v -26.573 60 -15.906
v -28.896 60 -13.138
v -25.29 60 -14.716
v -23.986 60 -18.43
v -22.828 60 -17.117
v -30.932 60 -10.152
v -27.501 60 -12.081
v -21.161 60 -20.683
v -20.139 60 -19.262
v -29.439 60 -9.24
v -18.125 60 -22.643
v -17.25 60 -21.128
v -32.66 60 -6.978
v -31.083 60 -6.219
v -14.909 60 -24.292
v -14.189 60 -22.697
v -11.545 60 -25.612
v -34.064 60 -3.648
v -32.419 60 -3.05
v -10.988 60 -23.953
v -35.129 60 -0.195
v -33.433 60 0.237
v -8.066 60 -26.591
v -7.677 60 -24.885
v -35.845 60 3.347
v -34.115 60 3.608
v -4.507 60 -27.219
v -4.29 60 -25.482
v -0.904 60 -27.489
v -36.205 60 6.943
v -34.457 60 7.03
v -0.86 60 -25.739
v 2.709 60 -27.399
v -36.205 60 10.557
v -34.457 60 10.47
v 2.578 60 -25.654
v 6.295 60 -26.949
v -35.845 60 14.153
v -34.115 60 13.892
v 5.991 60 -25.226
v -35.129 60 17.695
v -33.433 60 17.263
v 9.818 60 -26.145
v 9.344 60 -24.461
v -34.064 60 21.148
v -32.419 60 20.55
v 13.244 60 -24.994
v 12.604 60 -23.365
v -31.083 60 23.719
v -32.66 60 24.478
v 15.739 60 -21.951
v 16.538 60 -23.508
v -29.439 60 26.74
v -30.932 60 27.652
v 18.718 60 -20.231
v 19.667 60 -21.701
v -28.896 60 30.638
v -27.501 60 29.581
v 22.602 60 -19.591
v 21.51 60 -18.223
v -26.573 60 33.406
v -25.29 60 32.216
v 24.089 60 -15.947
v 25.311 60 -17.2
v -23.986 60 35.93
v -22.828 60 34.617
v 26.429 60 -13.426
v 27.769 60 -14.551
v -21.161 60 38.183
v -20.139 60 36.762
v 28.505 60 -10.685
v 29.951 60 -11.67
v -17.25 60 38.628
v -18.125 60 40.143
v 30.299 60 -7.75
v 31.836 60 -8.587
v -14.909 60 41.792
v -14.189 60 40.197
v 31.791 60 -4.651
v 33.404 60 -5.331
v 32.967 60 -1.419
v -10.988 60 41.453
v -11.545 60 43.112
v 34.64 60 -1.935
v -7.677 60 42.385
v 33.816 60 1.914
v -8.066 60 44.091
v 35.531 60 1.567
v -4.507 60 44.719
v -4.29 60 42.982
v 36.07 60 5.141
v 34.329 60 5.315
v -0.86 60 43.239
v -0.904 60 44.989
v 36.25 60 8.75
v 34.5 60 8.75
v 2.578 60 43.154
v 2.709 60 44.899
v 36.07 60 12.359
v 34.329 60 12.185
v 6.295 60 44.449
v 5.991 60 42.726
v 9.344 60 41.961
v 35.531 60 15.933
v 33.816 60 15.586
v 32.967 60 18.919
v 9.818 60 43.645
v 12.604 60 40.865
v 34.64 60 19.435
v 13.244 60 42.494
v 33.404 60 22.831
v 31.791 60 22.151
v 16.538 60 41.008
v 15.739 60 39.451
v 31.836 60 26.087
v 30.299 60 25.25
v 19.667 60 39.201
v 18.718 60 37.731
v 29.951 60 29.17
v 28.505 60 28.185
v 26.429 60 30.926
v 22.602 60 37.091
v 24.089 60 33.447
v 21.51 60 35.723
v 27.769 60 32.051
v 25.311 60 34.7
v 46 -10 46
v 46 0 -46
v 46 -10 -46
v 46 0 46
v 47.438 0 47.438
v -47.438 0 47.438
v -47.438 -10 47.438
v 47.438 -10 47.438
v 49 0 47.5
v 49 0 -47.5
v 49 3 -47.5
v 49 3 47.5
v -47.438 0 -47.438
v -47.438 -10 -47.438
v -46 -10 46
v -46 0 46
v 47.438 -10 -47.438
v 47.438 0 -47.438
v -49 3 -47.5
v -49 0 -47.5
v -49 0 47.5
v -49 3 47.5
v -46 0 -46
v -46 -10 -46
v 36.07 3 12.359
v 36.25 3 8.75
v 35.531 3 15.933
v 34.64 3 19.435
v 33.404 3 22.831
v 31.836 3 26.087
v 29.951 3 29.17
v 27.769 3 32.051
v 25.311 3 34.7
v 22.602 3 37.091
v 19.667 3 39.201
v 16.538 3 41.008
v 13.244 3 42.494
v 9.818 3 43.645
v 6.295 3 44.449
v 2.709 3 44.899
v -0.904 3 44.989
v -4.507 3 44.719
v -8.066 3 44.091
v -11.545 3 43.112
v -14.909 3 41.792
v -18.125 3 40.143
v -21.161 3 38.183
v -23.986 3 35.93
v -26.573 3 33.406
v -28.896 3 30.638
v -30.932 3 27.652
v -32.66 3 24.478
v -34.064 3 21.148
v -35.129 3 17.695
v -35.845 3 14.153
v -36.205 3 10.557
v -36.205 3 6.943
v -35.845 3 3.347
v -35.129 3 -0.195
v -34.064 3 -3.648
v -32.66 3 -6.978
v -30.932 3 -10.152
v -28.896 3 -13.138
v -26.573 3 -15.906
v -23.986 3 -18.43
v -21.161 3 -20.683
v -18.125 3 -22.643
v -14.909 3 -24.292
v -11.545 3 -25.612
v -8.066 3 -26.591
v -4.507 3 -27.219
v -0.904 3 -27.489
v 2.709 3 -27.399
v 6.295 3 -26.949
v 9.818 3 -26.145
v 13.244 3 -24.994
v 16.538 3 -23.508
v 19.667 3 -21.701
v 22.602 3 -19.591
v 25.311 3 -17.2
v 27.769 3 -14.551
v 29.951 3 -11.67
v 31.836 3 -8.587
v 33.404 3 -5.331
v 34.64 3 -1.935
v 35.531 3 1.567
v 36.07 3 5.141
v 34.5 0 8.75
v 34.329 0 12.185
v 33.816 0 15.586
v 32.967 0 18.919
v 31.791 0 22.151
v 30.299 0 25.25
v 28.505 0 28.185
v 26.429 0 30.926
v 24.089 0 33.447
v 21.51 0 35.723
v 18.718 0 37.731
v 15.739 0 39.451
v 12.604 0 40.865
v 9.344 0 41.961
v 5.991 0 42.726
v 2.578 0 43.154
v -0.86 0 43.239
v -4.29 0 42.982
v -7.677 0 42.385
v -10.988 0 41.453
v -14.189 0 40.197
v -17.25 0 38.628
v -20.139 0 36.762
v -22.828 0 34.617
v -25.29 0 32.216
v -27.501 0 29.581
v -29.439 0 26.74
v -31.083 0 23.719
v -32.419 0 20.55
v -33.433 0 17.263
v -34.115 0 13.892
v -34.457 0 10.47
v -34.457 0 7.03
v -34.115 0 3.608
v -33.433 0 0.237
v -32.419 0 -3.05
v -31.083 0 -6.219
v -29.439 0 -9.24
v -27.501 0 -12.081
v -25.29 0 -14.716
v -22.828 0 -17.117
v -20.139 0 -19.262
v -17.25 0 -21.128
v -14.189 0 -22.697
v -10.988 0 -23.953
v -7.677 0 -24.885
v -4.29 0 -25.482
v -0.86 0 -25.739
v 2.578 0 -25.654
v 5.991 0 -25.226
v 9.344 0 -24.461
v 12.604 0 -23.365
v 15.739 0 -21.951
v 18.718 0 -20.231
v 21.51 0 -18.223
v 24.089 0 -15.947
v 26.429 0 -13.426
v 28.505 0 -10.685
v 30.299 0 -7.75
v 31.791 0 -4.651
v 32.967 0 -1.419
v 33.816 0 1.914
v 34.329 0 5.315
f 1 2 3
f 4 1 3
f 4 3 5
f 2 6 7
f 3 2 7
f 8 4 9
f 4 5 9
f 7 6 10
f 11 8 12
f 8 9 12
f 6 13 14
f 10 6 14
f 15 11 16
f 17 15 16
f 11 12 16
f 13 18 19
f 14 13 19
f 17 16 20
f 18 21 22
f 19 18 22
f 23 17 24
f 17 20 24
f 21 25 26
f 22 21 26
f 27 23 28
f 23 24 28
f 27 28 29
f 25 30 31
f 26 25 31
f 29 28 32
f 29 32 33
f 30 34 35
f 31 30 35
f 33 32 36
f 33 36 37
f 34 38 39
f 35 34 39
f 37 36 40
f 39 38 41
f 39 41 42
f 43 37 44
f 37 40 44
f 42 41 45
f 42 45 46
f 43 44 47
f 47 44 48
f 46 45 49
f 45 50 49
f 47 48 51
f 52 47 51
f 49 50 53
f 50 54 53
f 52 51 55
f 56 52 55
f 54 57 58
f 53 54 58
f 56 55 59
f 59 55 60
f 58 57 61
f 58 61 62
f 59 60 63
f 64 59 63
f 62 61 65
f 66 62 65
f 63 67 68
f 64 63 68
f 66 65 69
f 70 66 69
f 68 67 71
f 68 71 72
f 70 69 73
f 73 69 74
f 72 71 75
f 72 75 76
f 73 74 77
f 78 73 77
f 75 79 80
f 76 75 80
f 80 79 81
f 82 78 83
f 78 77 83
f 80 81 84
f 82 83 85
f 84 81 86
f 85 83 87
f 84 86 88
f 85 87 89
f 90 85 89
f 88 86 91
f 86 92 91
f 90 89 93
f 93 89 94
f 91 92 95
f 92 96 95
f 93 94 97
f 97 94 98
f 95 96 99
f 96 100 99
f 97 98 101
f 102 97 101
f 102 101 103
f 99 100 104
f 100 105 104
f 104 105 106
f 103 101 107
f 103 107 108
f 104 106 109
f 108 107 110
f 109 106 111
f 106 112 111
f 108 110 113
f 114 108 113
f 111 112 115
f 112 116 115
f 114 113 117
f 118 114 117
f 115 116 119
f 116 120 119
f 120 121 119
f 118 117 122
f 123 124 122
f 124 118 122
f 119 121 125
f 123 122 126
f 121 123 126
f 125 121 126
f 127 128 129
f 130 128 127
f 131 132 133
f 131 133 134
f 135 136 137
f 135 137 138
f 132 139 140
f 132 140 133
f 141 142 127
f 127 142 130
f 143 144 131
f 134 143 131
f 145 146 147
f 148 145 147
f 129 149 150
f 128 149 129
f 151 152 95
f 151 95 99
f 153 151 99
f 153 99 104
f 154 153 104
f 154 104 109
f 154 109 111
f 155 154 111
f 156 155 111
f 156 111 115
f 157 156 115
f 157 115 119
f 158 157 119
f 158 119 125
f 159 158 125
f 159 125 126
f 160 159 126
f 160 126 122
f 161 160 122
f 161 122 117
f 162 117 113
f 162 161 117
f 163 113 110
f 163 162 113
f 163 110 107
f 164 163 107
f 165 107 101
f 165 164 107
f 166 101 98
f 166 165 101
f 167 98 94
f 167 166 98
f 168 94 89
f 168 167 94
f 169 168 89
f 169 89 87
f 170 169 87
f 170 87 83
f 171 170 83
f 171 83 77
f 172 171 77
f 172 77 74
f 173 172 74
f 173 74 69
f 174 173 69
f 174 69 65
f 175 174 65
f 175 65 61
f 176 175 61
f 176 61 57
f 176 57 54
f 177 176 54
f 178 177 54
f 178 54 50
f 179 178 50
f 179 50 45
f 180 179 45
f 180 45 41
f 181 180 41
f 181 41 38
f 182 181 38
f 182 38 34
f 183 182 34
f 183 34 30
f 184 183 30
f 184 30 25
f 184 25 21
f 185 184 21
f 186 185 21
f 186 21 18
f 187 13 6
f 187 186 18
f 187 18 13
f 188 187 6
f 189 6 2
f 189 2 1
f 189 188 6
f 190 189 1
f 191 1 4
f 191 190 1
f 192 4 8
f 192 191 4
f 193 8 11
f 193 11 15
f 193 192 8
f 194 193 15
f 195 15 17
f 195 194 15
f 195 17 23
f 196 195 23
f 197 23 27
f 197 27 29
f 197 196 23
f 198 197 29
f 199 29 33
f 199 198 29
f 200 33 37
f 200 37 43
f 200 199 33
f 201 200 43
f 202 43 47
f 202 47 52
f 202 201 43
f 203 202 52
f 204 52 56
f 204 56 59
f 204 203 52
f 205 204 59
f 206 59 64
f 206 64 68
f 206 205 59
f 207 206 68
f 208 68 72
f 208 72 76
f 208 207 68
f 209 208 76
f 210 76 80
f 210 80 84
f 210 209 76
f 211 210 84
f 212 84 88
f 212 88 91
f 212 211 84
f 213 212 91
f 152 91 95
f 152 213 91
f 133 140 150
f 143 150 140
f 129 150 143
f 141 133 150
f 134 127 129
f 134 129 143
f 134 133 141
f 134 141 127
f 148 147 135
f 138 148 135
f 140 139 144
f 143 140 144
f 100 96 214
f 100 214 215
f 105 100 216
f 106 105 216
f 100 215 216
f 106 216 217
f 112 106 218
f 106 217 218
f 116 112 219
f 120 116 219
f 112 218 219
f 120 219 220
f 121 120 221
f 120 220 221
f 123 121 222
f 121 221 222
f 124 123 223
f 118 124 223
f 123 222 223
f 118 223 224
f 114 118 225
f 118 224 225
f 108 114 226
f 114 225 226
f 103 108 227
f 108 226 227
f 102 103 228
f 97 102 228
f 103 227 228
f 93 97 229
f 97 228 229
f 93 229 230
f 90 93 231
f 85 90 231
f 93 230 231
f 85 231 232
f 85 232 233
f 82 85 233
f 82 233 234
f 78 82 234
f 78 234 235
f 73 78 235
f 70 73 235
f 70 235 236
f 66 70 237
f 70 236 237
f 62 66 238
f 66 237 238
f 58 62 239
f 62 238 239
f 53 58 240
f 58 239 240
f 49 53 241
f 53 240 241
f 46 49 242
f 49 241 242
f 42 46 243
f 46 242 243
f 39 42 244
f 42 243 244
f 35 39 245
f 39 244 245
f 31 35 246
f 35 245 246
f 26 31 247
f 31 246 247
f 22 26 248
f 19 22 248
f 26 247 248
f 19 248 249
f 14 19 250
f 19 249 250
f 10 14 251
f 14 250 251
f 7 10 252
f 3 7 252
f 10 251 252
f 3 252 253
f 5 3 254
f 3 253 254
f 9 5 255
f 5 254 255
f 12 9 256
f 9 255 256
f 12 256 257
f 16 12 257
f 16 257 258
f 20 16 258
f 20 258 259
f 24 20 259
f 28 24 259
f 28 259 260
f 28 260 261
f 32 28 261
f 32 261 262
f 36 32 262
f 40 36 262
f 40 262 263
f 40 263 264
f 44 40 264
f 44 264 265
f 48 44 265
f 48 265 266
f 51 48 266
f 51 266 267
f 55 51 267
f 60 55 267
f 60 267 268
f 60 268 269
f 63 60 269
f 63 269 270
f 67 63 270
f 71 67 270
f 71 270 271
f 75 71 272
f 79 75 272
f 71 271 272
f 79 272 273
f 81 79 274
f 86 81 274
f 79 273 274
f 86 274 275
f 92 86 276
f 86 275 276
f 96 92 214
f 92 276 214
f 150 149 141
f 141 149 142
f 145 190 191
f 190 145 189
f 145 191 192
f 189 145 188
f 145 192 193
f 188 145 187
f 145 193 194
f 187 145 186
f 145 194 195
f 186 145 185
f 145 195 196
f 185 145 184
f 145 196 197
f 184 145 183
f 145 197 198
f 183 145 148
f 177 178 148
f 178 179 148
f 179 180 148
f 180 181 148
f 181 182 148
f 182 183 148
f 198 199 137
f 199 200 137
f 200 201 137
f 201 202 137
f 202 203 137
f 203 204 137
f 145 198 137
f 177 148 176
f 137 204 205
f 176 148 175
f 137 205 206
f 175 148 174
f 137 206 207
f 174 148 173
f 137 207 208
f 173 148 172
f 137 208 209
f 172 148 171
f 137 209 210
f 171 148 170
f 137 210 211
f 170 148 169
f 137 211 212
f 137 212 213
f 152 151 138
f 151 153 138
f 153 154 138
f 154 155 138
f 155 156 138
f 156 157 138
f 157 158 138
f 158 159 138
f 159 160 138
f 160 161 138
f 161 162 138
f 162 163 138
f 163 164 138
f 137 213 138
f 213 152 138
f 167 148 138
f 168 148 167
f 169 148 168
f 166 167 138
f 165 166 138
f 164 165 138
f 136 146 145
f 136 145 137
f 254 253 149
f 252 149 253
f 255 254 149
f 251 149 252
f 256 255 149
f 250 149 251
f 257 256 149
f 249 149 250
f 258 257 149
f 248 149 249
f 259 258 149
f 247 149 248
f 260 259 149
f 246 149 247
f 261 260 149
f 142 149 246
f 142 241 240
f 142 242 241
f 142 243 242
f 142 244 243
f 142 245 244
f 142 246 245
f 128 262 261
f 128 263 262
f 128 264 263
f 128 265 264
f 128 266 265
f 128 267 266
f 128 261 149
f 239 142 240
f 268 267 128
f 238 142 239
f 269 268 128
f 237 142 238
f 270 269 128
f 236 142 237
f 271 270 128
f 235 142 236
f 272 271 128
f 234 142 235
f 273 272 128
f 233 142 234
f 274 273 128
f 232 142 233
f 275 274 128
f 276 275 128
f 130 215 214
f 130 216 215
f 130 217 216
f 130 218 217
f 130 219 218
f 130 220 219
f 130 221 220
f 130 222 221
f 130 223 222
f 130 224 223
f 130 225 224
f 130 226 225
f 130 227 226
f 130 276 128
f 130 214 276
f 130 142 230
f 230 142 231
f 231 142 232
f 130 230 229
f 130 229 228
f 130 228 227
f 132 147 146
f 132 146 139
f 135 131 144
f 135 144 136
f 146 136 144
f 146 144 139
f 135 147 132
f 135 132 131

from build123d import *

# Parameters (mm, degrees)
F0_W     = 98
F0_H     = 95
F1_DEPTH = 3
F2_R     = 36.25
F2_R_2   = 33.25
F3_DEPTH = 4
F4_R     = 36.25
F4_R_2   = 34.5
F5_DEPTH = 60
F6_W     = 94.875
F6_H     = 94.875
F6_W_2   = 92
F6_H_2   = 92
F7_DEPTH = 10


with BuildPart() as f1:
    # F0 (on Front) → F1 (new body)
    with BuildSketch(Plane.XZ):
        Rectangle(F0_W, F0_H)
    extrude(amount=-F1_DEPTH)

    # F2 (on Front) → F3 (cut)
    with BuildSketch(Plane.XZ):
        with Locations((0, 8.75)):
            Circle(F2_R)
        with Locations((0, 8.75)):
            Circle(F2_R_2, mode=Mode.SUBTRACT)
        with Locations((0, 8.75)):
            Circle(F2_R_2)
    extrude(amount=-F3_DEPTH, mode=Mode.SUBTRACT)

    # F4 (on face) → F5 (join)
    with BuildSketch(Plane.XZ):
        with Locations((0, 8.75)):
            Circle(F4_R)
        with Locations((0, 8.75)):
            Circle(F4_R_2, mode=Mode.SUBTRACT)
    extrude(amount=-F5_DEPTH)

    # F6 (on Front) → F7 (join)
    with BuildSketch(Plane.XZ):
        Rectangle(F6_W, F6_H)
        Rectangle(F6_W_2, F6_H_2, mode=Mode.SUBTRACT)
    extrude(amount=F7_DEPTH)


solid = f1.part
